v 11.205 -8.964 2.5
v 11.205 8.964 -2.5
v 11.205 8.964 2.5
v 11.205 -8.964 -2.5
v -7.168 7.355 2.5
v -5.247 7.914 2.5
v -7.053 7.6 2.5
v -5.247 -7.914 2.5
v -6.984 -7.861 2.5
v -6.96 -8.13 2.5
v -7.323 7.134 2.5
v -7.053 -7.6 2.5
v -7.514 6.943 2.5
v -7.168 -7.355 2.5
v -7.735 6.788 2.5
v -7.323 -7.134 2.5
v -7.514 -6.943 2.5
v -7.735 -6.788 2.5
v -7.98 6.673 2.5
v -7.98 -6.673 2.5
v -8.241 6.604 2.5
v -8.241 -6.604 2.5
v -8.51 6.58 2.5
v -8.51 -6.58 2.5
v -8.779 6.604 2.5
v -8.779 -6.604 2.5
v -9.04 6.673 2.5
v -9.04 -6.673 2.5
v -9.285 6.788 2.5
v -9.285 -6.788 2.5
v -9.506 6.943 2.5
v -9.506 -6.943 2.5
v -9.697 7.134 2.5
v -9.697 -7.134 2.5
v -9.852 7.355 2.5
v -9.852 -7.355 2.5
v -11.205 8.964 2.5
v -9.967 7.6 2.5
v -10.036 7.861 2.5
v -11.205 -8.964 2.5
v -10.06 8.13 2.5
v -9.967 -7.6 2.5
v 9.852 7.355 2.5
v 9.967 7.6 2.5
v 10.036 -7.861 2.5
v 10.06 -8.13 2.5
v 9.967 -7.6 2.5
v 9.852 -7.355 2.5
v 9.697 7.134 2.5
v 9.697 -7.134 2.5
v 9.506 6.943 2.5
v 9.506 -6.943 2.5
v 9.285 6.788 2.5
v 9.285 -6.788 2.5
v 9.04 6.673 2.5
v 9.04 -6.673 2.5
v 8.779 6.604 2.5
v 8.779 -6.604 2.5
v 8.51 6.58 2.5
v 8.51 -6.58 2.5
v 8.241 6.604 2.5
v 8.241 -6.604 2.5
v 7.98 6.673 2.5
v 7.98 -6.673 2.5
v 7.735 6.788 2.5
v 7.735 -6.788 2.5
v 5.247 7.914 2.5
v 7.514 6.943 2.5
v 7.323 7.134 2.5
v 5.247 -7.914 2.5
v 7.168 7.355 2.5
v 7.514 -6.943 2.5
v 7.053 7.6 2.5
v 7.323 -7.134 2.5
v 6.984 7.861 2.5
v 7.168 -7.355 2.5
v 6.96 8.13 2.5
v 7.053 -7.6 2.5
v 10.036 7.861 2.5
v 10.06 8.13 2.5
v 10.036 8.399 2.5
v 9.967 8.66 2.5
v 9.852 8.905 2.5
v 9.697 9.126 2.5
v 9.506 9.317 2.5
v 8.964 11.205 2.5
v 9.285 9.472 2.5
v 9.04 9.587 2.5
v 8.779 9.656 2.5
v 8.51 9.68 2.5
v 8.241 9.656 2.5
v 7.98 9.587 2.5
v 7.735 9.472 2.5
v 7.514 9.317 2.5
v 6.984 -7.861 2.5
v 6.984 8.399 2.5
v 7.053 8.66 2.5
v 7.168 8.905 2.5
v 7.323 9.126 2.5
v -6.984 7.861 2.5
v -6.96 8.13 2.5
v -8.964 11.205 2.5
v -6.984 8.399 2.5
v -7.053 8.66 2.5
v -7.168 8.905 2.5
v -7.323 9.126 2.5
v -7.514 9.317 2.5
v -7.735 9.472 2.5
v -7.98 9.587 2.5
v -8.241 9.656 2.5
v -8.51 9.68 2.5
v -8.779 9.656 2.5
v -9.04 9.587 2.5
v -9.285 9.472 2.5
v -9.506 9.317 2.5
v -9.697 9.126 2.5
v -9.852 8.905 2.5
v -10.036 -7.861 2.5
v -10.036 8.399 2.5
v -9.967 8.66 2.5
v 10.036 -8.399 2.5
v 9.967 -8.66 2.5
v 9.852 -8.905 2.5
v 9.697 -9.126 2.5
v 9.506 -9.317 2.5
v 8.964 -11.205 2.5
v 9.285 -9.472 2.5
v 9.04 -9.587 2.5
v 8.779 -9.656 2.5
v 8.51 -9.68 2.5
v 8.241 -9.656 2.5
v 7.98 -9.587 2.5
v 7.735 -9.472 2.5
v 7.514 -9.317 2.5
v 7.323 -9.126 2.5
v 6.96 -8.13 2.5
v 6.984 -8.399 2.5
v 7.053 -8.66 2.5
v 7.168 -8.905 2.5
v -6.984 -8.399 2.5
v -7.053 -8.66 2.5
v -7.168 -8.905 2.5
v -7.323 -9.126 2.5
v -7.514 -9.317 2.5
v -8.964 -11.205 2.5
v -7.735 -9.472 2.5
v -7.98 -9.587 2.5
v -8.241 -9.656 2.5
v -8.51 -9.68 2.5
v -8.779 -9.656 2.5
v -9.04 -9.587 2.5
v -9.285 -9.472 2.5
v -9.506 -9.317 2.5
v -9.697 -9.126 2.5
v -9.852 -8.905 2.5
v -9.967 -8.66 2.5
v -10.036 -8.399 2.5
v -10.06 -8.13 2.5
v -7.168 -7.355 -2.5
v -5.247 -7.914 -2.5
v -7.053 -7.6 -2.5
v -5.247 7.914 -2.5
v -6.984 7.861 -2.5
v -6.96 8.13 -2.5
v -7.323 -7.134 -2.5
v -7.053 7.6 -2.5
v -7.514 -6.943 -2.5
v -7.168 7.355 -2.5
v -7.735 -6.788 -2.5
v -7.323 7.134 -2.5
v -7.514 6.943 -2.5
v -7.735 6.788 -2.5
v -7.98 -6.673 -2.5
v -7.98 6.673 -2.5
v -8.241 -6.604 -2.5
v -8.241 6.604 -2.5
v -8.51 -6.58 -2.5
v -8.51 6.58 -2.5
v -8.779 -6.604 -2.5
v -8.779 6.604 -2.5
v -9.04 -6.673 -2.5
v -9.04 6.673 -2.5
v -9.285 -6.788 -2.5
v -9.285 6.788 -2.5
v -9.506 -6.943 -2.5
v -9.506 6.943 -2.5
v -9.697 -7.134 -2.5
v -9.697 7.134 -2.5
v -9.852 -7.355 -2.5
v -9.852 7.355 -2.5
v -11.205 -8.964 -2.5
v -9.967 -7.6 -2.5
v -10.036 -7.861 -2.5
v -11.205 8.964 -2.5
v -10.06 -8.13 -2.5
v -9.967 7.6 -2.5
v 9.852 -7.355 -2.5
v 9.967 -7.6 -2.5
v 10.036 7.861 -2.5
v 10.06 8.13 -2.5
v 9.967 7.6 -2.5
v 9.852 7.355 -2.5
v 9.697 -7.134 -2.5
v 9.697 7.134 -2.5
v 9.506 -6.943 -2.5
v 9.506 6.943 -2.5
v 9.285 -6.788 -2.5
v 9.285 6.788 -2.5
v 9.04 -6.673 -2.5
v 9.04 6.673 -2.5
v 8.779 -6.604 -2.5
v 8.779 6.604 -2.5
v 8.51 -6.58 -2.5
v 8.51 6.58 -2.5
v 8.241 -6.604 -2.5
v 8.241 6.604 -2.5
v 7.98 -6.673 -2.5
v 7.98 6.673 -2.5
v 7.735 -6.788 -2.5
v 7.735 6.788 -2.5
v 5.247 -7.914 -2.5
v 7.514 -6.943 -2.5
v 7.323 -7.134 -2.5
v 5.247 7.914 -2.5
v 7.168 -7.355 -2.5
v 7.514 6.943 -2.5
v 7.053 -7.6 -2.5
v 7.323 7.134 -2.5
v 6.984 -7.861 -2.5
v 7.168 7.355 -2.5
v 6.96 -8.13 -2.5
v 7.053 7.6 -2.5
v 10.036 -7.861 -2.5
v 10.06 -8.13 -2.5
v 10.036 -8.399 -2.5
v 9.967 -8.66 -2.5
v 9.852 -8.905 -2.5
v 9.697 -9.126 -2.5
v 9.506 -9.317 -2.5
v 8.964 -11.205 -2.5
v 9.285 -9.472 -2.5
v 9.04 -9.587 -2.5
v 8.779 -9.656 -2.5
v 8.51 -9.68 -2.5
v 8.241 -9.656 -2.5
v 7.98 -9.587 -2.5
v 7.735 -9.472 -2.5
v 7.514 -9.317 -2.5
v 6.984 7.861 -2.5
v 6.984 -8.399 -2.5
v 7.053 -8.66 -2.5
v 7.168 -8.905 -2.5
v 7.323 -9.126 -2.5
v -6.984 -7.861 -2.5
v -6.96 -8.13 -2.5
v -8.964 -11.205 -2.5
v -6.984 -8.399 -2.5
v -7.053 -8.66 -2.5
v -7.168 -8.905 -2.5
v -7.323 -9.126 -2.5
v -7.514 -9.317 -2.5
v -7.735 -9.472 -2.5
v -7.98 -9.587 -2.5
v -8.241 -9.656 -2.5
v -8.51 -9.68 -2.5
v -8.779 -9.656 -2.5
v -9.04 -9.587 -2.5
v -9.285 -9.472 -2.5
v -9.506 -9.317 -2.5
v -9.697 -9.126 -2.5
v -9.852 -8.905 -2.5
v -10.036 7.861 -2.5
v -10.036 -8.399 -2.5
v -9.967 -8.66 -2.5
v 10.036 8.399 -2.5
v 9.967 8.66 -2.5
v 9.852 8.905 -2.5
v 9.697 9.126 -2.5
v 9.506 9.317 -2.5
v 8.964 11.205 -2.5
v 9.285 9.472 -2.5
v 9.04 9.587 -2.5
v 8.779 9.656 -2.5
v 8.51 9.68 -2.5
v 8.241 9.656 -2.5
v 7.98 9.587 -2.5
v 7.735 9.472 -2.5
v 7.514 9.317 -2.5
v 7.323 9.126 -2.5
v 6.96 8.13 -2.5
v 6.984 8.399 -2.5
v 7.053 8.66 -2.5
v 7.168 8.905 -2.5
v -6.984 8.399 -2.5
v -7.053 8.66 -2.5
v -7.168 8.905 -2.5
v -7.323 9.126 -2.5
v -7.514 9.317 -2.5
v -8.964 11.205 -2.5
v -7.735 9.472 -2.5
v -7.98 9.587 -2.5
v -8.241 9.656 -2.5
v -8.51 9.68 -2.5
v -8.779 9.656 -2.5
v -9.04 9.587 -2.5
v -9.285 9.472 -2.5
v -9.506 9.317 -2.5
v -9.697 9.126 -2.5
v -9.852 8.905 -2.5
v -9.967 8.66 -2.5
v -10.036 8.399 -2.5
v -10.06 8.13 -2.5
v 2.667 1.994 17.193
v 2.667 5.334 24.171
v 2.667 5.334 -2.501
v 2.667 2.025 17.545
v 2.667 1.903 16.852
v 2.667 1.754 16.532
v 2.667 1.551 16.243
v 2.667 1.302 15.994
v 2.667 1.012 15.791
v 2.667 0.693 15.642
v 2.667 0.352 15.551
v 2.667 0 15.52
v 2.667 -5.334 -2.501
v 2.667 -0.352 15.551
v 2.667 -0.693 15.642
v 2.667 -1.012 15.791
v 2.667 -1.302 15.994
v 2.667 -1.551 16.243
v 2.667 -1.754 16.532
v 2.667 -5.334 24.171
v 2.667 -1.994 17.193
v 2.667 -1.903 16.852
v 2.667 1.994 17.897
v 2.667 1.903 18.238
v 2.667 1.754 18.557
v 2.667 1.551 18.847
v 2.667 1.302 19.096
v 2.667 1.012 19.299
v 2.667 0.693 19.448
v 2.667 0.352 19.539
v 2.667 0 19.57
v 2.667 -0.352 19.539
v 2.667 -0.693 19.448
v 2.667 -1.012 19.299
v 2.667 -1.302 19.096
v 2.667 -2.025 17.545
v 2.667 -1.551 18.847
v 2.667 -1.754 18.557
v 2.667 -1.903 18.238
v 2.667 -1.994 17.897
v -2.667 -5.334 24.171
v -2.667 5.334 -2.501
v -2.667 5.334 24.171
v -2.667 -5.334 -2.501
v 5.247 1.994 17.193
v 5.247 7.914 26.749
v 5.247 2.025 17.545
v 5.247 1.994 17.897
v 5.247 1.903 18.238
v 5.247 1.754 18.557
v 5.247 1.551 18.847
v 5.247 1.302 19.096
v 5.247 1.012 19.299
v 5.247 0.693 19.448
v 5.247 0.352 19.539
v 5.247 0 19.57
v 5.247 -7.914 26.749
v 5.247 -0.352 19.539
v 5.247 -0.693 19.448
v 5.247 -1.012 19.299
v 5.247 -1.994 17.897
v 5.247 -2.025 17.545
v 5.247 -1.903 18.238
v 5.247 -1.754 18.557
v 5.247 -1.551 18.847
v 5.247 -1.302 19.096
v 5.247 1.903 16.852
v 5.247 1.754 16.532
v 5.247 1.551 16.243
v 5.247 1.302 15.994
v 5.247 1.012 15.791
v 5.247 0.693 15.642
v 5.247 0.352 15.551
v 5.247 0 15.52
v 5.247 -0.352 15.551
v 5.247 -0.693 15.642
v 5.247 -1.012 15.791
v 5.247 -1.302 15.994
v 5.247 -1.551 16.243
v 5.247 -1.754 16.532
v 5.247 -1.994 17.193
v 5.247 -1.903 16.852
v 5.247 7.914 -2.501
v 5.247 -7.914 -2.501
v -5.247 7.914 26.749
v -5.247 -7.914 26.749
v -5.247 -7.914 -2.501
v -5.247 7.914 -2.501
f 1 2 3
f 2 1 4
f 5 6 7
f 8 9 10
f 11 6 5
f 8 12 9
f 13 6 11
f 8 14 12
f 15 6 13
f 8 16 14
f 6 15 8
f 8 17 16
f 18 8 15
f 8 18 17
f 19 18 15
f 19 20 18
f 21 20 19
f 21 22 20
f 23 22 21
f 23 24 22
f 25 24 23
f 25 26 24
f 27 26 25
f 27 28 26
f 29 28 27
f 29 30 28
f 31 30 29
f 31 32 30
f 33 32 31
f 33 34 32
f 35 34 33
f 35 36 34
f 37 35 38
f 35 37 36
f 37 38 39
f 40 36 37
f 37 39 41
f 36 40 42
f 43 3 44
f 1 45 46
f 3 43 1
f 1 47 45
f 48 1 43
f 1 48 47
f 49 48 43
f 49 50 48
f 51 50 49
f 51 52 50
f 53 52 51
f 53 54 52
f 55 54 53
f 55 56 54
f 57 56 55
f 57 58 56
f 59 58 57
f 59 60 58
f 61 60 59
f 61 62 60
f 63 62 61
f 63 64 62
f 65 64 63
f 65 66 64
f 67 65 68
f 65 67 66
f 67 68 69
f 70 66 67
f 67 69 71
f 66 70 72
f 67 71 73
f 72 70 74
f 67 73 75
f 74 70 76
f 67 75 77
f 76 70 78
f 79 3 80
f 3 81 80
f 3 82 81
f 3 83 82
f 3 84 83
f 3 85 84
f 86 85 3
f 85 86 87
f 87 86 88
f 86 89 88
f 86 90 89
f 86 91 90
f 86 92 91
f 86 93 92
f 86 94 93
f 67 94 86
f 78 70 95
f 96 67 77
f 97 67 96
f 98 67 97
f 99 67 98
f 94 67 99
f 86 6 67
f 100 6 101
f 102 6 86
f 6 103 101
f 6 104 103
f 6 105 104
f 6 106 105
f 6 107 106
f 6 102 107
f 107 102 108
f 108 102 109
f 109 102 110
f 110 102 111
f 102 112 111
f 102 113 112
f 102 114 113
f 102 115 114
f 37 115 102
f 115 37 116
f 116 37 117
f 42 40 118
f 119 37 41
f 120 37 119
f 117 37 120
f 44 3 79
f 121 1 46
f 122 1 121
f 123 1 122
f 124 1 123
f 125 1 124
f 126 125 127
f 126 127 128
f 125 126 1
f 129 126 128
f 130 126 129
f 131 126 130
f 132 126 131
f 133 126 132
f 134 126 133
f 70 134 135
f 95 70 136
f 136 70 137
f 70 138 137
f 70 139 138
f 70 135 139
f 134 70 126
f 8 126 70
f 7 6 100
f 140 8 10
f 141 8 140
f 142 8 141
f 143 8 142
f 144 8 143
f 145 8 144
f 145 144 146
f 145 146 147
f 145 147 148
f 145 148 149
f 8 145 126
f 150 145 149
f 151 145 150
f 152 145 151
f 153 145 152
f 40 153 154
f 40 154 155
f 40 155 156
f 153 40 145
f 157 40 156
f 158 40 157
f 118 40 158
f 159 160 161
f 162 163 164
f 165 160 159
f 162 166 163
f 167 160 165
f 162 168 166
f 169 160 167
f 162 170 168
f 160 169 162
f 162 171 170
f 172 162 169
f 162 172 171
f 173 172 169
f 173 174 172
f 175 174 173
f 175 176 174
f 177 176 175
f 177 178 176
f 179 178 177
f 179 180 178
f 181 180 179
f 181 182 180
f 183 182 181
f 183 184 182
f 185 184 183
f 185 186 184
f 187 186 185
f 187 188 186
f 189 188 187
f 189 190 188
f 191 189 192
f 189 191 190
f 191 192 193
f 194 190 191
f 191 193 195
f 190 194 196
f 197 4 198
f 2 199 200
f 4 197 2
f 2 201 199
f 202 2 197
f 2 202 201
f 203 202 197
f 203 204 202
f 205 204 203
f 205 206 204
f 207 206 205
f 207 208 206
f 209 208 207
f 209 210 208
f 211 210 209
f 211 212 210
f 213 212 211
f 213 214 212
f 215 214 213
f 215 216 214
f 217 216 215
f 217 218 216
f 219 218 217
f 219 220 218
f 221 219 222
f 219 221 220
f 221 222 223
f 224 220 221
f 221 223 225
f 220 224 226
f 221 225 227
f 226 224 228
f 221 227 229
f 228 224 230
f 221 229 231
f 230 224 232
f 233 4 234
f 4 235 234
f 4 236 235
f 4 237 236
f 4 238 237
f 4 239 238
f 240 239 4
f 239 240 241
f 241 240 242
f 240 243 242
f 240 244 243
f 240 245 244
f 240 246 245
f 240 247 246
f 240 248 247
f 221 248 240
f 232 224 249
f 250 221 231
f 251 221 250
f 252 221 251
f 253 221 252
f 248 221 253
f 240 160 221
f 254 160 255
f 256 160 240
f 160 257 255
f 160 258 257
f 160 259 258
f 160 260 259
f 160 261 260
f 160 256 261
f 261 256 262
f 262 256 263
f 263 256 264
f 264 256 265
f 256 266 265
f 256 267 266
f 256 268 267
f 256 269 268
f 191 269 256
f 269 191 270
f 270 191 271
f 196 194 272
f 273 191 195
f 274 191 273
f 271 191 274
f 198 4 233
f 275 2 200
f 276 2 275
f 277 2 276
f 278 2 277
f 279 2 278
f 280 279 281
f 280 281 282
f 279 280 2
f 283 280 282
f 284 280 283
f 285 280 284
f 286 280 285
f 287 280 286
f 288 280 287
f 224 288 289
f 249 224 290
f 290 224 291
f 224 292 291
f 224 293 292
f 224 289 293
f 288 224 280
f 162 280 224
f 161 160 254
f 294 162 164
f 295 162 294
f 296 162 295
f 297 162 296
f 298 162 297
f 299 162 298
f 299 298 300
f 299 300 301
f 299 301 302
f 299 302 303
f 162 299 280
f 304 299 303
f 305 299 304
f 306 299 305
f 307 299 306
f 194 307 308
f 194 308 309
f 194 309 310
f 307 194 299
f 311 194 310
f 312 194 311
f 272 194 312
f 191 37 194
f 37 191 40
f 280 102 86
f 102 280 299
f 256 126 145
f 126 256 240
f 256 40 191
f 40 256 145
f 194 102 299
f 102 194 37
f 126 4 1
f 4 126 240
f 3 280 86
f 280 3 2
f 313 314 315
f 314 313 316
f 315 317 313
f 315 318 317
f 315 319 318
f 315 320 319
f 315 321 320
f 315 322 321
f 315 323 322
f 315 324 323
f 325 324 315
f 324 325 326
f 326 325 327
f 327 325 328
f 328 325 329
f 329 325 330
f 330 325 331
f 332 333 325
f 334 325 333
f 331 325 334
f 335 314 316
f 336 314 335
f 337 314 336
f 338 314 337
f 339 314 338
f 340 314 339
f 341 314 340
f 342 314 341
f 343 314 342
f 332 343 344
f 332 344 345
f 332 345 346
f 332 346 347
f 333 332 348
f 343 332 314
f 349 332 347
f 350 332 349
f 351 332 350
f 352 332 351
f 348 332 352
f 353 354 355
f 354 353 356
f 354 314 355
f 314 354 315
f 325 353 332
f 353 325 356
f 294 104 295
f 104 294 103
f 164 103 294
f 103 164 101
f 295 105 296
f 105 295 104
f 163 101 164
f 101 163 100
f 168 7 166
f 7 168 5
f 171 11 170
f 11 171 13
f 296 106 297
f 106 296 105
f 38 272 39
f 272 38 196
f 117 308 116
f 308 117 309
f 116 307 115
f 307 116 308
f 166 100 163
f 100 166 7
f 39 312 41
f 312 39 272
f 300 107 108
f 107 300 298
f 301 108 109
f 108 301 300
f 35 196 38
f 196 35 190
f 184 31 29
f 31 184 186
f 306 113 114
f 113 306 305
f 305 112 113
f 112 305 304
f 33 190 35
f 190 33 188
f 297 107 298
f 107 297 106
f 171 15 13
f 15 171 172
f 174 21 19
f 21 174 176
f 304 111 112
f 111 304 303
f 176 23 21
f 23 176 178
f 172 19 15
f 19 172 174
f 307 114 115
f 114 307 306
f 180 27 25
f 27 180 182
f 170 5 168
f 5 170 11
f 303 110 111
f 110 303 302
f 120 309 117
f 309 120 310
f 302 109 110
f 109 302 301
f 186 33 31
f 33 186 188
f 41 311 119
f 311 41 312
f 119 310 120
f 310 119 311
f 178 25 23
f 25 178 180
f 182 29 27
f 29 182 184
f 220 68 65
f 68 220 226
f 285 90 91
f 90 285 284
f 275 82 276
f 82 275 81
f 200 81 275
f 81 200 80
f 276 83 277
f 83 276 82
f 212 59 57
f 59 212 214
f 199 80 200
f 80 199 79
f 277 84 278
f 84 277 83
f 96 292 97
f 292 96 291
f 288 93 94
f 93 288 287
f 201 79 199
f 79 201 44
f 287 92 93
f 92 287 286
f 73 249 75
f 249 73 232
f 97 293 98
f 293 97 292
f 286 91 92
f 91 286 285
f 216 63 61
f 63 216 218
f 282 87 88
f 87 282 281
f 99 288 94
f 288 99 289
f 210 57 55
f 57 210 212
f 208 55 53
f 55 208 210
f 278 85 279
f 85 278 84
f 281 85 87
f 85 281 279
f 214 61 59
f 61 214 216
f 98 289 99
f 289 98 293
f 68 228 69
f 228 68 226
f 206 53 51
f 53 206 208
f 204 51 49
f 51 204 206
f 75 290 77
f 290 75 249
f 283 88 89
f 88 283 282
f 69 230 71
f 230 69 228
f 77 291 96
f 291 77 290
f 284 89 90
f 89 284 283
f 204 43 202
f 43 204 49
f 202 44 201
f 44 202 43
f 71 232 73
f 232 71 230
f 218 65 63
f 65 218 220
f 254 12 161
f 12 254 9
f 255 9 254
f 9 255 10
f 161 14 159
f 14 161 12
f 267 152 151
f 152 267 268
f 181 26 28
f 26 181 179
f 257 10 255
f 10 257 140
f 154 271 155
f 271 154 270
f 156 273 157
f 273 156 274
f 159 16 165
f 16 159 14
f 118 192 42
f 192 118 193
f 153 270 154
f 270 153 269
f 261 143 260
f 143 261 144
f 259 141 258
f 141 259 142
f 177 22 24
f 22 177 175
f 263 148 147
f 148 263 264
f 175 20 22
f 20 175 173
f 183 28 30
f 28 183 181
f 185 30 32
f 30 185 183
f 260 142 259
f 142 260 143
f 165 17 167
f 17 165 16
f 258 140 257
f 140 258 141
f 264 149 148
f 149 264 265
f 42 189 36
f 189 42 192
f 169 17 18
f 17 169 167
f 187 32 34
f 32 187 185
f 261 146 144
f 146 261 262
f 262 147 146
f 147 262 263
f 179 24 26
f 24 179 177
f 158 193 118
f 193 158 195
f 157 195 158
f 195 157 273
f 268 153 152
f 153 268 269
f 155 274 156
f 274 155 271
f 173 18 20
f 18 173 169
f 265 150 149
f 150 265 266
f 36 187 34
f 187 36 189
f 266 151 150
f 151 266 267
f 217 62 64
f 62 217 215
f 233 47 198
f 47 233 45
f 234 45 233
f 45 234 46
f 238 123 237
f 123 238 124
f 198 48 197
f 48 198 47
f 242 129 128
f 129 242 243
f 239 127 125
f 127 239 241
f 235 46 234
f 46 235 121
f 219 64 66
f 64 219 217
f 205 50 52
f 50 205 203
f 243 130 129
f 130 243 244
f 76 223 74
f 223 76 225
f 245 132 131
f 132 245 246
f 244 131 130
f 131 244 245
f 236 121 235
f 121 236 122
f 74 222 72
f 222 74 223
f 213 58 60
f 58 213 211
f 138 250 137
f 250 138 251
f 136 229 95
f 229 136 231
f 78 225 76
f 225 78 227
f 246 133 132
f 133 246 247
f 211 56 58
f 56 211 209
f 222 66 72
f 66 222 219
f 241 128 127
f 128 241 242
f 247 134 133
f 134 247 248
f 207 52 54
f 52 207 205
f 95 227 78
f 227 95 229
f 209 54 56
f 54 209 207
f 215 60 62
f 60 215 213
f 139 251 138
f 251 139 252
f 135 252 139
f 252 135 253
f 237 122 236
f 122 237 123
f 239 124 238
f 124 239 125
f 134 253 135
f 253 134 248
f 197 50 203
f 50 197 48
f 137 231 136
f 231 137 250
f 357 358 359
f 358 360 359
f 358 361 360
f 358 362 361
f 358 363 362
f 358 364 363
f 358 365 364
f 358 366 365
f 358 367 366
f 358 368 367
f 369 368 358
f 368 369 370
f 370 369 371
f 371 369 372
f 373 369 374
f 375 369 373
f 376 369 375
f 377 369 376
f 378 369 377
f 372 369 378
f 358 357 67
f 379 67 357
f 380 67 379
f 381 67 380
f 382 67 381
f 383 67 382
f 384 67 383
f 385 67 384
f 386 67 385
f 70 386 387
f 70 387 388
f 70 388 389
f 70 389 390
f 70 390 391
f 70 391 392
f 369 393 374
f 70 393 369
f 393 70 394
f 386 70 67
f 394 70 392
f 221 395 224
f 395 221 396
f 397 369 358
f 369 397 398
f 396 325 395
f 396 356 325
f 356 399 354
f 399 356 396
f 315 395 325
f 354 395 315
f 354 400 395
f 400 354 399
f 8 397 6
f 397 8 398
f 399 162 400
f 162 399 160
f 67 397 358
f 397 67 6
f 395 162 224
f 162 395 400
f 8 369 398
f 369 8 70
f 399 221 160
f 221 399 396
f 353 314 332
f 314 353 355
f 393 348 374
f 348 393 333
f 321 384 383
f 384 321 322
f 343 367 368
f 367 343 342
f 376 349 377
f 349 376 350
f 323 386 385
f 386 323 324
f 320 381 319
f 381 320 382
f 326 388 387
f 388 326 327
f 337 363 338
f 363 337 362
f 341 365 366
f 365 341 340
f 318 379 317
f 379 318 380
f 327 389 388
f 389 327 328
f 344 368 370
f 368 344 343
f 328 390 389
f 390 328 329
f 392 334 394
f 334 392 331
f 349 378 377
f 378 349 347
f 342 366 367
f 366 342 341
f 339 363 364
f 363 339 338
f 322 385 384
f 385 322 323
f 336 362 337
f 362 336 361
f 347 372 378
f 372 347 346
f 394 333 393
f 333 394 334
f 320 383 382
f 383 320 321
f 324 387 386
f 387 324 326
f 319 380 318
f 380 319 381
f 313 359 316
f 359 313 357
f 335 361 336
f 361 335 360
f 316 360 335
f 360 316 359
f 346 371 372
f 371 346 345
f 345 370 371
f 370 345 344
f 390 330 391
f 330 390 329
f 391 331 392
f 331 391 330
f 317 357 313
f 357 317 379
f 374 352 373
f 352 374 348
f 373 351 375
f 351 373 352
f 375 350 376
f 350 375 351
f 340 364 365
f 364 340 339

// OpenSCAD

// *************************************************************
// (C) 2013 Dipl.Ing. Rolf-Dieter Klein, Munich Germany
// OpenSource -- would be great to keep my name as reference
// www.rdklein.de
// report error, problems to rdklein@rdklein.de
// *************************************************************
// WR Flange Code 
wrcode = 6; // [1:WR112,2:WR90,3:WR75,4:WR62,5:WR51,6:WR42,7:WR34,8:WR28]
//
// Diameter of Coax Adapter (in mm)
coaxsize = 4.05;  // SMA Adapter dielectric diameter
//
// overall wall thickness in mm
wall = 2.58; // also thickness of SMA Adapter dielectric to contact
// flange thickness
flanged = 5; // flange thickness
// add length *lambda/2
addlen = 1;
// standard dimension tables
// WR cannot be entered directly due to openscad variable restrictions
// a case of if for assignment cannot be used, index is easier for this.
// WR 112 7.05-10.00 GHz
// WR 90  8.20-12.40 GHz
// WR 75  10.00-15.00 GHz
// WR 62  12.49-18.00 GHz
// WR 51  15.00-22.00 GHz
// WR 42  18.00-26.50 GHz
// WR 34  22.00-33.00 GHz
// WR 28  26.50-40.00 GHz
//
// do not change:
wrtab = [0,112,90,75,62,51,42,34,28]*1.0;
// do not change:
atab = [0,47.9,41.4,38.3,33.3,31.0,22.41,22.1,19.05]*1.0;
// do not change:
etab = [0,18.72,16.26,14.25,12.14,11.25,8.51,7.9,6.73]*1.0;
// do not change:
ftab = [0,17.17,15.49,13.21,12.63,10.29,8.13,7.5,6.34]*1.0;
// do not change:
drilltab=[0,4.3,4.3,4.1,4.1,4.1,3.1,3.1,3.0]*1.0;
// dann werte zuweisen
// ueber index
sizea = atab[wrcode]; // square size of flange
sizee = etab[wrcode]; // holes from smaller 
sizef = ftab[wrcode]; // holes from larger 
drill = drilltab[wrcode]/2.0; // drill for flange mounting
wr = wrtab[wrcode];
lquat = wr/20.0*2.54; // lamba 4 in mm
// faces for precision
$fn=36; // faces for precision
//
// *********** FLANGE ****************
// Draw A Flange with mounting holes
//
difference() {
 difference() {
 	intersection() {

		cube([sizea,sizea,flanged],center=true);
		rotate([0,0,45]) cube([sizea*1.4142*0.9,sizea*1.4142*0.9,flanged],center=true);
	}
	cube([lquat,lquat*2,flanged*2],center=true);
 } 
 translate([-sizee,sizef,0]) cylinder(h=flanged*2,r=drill,center=true);
 translate([sizee,sizef,0]) cylinder(h=flanged*2,r=drill,center=true);
 translate([-sizee,-sizef,0]) cylinder(h=flanged*2,r=drill,center=true);
 translate([sizee,-sizef,0]) cylinder(h=flanged*2,r=drill,center=true);
}
//
// ***** Transisition adapater *****
// designed for simple hole using a coax cable; Sma etc.
// with no mounting holes 
// tuning screws also omitted (due to inperfection of 3d prints anyway...)
offsetbool = 0.001;
translate([0,0,lquat*3/2+wall/2-offsetbool-flanged/2+addlen*lquat]) difference() {
 difference() {
	translate([0,0,0]) cube([lquat+wall*2,lquat*2+wall*2,lquat*3+addlen*lquat*2+wall*1],center=true);
	translate([0,0,-wall/2-offsetbool]) cube([lquat,lquat*2,lquat*(3+offsetbool)+addlen*lquat*2],center=true);
 }

 // drill hole for coax, position lamba/4 of waveguide from end size
 // waveguide here 3*l/4
 translate([lquat/2+wall/2,0,lquat/2+addlen*lquat-wall]) rotate ([0,90,0]) cylinder(h=wall*2,r=coaxsize/2,center=true);
}
//

 
